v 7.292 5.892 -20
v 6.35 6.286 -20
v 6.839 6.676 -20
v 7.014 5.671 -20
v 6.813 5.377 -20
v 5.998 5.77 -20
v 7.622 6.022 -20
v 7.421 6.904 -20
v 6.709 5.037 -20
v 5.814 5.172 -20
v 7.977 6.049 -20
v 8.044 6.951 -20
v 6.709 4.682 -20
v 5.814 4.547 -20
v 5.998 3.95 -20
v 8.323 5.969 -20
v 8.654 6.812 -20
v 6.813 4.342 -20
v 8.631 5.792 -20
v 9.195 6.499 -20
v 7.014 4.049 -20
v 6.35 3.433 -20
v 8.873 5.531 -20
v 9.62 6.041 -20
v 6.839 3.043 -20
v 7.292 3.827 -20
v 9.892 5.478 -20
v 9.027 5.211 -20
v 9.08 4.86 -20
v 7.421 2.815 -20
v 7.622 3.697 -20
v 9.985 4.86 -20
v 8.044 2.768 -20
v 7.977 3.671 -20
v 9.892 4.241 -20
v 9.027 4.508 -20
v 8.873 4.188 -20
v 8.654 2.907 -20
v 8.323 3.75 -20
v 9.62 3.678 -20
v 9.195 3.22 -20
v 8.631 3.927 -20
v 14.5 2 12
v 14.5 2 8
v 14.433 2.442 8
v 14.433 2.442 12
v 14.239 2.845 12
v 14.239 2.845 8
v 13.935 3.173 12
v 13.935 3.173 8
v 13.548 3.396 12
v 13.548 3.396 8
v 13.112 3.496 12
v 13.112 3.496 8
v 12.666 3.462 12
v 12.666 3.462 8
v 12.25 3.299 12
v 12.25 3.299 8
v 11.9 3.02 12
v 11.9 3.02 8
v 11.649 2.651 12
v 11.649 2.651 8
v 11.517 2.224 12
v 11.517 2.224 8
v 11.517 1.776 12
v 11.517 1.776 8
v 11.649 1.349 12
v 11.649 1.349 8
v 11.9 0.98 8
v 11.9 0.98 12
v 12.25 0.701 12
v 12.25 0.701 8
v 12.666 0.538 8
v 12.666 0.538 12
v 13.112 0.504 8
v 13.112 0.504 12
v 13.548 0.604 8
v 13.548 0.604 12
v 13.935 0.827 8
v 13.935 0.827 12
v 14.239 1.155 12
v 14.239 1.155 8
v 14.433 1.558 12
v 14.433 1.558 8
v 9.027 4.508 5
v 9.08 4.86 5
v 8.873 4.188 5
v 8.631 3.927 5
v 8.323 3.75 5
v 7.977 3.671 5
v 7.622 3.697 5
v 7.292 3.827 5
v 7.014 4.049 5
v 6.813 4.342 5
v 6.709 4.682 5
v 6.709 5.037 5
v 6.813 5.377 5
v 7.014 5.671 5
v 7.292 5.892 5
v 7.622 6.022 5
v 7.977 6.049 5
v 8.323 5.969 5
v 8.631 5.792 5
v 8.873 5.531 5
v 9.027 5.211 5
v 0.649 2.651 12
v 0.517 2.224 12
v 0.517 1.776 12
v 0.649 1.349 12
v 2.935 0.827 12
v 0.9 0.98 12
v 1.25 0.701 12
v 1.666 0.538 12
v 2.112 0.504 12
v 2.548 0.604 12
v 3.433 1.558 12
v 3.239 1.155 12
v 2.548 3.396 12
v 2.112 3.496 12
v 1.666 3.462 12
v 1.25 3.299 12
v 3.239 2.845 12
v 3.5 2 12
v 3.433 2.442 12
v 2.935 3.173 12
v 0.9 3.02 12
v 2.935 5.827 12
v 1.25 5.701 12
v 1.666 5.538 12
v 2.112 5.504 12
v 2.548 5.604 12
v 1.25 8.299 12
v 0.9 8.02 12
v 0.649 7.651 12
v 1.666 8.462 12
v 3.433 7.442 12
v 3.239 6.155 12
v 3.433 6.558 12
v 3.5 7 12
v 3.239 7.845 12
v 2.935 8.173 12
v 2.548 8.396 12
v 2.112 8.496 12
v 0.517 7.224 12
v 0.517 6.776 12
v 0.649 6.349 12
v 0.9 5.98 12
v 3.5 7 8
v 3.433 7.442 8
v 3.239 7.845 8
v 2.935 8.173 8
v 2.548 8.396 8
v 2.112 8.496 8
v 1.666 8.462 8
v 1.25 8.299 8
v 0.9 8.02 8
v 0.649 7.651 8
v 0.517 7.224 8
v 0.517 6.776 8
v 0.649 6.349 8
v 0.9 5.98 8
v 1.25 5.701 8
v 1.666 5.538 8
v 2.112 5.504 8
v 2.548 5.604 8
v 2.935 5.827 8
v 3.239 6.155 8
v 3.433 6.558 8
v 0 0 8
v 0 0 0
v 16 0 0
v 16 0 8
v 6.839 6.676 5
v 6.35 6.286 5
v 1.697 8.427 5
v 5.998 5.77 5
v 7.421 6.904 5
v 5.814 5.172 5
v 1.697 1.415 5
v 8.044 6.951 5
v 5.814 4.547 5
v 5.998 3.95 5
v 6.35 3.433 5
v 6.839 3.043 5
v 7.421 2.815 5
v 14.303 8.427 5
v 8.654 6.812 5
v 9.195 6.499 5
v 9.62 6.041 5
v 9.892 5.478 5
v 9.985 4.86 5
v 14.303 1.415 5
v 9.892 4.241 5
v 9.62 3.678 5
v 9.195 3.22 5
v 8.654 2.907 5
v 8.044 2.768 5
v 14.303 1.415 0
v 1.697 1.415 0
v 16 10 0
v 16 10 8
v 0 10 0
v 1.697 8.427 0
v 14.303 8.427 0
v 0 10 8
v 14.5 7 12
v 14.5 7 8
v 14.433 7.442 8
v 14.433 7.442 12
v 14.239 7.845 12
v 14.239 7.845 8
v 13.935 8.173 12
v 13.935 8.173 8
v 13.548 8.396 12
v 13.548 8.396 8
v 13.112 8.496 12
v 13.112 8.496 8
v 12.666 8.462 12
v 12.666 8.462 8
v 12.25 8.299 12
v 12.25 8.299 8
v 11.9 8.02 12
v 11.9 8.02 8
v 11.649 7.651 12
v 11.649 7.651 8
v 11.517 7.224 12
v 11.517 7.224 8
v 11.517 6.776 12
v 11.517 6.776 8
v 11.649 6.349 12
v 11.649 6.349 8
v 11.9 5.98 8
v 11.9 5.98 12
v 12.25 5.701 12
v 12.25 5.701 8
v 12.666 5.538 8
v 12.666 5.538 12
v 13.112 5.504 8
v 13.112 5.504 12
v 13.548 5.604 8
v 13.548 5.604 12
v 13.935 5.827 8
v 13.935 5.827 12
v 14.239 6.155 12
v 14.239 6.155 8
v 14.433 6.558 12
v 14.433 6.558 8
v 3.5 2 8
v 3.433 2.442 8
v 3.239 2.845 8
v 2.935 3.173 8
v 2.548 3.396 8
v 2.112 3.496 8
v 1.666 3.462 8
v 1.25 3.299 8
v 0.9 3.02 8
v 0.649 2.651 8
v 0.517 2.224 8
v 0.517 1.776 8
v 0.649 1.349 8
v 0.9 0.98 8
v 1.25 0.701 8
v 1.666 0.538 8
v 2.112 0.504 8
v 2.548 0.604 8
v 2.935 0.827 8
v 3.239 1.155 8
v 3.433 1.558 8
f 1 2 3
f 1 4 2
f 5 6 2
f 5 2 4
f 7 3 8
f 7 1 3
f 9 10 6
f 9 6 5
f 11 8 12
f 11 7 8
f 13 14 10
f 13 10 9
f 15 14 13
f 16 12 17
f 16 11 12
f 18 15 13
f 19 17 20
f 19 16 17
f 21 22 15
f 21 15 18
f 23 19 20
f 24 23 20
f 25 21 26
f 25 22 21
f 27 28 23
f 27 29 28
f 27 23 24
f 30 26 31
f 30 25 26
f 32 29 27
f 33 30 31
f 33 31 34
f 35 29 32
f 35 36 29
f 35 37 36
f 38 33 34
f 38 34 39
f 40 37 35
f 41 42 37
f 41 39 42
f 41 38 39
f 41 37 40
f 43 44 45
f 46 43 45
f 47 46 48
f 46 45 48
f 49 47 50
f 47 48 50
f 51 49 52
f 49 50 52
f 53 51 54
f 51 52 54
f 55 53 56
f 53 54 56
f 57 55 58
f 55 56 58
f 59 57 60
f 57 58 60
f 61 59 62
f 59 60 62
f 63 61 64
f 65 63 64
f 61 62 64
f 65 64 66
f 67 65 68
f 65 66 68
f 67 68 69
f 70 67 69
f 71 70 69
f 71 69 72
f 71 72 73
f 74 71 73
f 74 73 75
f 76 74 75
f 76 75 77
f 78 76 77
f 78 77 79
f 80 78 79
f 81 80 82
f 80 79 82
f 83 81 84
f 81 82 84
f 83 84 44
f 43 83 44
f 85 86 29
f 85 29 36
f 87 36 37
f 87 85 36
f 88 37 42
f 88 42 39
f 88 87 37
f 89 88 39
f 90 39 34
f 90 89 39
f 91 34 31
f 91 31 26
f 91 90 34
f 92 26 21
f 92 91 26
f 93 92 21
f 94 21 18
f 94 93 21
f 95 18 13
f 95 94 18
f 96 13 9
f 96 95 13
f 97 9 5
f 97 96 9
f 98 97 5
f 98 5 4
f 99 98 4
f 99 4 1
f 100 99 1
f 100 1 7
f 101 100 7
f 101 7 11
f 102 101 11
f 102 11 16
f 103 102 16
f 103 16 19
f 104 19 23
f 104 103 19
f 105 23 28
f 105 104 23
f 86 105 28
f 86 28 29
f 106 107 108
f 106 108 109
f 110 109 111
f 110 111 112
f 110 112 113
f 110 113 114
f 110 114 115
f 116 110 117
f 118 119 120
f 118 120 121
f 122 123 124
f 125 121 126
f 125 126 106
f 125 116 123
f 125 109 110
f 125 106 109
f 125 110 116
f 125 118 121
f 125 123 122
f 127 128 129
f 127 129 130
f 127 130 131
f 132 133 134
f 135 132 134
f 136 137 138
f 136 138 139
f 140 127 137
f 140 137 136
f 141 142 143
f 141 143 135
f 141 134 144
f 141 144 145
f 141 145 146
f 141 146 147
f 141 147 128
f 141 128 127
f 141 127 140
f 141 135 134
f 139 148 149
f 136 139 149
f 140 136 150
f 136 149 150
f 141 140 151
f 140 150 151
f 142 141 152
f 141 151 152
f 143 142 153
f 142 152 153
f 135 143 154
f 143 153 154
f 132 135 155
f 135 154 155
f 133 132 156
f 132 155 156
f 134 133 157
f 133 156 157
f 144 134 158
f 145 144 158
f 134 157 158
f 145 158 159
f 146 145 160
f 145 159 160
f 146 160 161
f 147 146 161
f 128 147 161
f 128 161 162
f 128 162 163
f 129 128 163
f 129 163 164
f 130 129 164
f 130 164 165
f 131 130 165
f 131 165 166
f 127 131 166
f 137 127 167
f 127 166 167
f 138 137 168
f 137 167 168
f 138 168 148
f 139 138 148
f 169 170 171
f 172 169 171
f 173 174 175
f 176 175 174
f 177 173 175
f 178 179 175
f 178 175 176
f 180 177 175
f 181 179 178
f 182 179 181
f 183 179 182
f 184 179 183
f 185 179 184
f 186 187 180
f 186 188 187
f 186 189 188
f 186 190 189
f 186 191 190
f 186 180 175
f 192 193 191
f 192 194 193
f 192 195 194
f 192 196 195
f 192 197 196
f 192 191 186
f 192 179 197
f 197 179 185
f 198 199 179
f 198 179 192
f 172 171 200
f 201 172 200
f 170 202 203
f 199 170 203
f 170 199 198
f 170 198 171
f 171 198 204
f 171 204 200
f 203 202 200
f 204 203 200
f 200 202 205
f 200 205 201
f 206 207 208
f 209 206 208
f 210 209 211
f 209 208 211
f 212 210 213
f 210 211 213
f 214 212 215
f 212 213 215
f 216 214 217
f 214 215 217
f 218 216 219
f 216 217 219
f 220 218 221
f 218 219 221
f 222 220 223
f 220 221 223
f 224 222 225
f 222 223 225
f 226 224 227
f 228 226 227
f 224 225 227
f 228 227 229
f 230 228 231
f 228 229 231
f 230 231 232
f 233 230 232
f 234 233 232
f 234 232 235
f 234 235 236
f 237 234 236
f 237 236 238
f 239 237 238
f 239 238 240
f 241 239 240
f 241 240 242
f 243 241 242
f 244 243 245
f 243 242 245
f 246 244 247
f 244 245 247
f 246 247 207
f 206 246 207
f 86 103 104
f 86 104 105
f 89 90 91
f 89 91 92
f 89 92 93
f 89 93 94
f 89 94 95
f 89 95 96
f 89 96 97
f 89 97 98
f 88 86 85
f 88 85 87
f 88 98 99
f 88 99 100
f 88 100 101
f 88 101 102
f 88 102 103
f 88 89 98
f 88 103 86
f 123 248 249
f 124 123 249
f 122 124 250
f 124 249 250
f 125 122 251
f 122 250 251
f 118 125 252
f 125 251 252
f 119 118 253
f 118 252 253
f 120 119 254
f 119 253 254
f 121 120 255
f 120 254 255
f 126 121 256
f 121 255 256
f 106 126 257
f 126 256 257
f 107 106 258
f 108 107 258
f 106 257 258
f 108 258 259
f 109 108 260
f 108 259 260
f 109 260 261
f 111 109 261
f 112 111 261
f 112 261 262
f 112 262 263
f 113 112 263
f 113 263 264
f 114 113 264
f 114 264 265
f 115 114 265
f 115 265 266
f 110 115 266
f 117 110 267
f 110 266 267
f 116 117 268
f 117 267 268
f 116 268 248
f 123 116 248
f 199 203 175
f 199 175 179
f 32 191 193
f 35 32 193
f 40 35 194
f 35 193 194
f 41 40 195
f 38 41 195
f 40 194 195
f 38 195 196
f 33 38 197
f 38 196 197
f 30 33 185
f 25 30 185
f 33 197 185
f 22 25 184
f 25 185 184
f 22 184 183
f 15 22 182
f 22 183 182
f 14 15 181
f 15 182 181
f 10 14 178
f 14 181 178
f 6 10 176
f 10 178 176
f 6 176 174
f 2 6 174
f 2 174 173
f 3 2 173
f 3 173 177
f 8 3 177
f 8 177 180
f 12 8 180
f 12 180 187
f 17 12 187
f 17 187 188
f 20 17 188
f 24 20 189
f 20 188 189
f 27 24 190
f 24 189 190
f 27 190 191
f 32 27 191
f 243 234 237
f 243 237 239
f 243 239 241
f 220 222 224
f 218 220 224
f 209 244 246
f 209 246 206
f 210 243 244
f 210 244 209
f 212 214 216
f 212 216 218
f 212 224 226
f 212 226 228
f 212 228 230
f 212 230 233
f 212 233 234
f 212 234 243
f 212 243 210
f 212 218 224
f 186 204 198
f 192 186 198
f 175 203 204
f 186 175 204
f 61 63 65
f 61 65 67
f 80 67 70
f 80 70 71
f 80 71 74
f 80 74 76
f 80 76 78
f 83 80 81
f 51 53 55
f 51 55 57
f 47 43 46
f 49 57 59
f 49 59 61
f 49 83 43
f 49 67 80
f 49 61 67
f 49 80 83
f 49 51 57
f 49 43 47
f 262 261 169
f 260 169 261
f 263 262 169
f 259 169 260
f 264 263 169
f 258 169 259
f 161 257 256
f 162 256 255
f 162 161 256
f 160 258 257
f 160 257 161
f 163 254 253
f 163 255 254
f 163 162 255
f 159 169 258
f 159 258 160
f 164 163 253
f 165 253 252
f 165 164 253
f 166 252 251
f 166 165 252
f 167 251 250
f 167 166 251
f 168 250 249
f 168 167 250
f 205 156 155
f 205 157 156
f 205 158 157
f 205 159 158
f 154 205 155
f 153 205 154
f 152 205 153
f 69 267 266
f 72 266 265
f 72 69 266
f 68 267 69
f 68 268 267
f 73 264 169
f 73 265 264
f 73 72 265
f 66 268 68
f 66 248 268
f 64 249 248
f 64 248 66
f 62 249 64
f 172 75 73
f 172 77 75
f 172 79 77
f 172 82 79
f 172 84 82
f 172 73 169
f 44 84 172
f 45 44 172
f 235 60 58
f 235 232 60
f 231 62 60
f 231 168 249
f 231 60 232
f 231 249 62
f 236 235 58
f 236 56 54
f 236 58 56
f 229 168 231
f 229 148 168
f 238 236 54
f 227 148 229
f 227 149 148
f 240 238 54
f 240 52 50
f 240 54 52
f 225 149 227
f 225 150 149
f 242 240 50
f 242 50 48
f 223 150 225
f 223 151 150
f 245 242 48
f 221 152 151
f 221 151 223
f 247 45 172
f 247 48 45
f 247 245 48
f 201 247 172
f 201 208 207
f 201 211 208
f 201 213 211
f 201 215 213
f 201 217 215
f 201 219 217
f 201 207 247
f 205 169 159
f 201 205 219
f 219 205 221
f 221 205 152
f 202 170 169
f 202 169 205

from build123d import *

# Parameters (mm, degrees)
F0_W     = 16
F0_H     = 10
F1_DEPTH = 8
F2_R     = 1.5
F3_DEPTH = 4
F4_W     = 12.605189
F4_H     = 7.011637
F5_DEPTH = 5
F6_R     = 2.097092
F6_R_2   = 1.192292
F7_DEPTH = 25


with BuildPart() as f1:
    # F0 (on Top) → F1 (new body)
    with BuildSketch(Plane.XY):
        with Locations((8, 5)):
            Rectangle(F0_W, F0_H)
    extrude(amount=F1_DEPTH)

    # F2 (on face) → F3 (join)
    with BuildSketch(Plane.XY.offset(8)):
        with Locations((2, 2)):
            Circle(F2_R)
        with Locations((13, 2)):
            Circle(F2_R)
        with Locations((13, 7)):
            Circle(F2_R)
        with Locations((2, 7)):
            Circle(F2_R)
    extrude(amount=F3_DEPTH)

    # F4 (on face) → F5 (cut)
    with BuildSketch(Plane(origin=(0, 0, 0), x_dir=(1, 0, 0), z_dir=(0, 0, -1))):
        with Locations((7.999999, -4.921217)):
            Rectangle(F4_W, F4_H)
    extrude(amount=-F5_DEPTH, mode=Mode.SUBTRACT)

    # F6 (on face) → F7 (join)
    with BuildSketch(Plane(origin=(0, 0, 5), x_dir=(1, 0, 0), z_dir=(0, 0, -1))):
        with Locations((7.887701, -4.859625)):
            Circle(F6_R)
        with Locations((7.887701, -4.859625)):
            Circle(F6_R_2, mode=Mode.SUBTRACT)
    extrude(amount=F7_DEPTH)


solid = f1.part
